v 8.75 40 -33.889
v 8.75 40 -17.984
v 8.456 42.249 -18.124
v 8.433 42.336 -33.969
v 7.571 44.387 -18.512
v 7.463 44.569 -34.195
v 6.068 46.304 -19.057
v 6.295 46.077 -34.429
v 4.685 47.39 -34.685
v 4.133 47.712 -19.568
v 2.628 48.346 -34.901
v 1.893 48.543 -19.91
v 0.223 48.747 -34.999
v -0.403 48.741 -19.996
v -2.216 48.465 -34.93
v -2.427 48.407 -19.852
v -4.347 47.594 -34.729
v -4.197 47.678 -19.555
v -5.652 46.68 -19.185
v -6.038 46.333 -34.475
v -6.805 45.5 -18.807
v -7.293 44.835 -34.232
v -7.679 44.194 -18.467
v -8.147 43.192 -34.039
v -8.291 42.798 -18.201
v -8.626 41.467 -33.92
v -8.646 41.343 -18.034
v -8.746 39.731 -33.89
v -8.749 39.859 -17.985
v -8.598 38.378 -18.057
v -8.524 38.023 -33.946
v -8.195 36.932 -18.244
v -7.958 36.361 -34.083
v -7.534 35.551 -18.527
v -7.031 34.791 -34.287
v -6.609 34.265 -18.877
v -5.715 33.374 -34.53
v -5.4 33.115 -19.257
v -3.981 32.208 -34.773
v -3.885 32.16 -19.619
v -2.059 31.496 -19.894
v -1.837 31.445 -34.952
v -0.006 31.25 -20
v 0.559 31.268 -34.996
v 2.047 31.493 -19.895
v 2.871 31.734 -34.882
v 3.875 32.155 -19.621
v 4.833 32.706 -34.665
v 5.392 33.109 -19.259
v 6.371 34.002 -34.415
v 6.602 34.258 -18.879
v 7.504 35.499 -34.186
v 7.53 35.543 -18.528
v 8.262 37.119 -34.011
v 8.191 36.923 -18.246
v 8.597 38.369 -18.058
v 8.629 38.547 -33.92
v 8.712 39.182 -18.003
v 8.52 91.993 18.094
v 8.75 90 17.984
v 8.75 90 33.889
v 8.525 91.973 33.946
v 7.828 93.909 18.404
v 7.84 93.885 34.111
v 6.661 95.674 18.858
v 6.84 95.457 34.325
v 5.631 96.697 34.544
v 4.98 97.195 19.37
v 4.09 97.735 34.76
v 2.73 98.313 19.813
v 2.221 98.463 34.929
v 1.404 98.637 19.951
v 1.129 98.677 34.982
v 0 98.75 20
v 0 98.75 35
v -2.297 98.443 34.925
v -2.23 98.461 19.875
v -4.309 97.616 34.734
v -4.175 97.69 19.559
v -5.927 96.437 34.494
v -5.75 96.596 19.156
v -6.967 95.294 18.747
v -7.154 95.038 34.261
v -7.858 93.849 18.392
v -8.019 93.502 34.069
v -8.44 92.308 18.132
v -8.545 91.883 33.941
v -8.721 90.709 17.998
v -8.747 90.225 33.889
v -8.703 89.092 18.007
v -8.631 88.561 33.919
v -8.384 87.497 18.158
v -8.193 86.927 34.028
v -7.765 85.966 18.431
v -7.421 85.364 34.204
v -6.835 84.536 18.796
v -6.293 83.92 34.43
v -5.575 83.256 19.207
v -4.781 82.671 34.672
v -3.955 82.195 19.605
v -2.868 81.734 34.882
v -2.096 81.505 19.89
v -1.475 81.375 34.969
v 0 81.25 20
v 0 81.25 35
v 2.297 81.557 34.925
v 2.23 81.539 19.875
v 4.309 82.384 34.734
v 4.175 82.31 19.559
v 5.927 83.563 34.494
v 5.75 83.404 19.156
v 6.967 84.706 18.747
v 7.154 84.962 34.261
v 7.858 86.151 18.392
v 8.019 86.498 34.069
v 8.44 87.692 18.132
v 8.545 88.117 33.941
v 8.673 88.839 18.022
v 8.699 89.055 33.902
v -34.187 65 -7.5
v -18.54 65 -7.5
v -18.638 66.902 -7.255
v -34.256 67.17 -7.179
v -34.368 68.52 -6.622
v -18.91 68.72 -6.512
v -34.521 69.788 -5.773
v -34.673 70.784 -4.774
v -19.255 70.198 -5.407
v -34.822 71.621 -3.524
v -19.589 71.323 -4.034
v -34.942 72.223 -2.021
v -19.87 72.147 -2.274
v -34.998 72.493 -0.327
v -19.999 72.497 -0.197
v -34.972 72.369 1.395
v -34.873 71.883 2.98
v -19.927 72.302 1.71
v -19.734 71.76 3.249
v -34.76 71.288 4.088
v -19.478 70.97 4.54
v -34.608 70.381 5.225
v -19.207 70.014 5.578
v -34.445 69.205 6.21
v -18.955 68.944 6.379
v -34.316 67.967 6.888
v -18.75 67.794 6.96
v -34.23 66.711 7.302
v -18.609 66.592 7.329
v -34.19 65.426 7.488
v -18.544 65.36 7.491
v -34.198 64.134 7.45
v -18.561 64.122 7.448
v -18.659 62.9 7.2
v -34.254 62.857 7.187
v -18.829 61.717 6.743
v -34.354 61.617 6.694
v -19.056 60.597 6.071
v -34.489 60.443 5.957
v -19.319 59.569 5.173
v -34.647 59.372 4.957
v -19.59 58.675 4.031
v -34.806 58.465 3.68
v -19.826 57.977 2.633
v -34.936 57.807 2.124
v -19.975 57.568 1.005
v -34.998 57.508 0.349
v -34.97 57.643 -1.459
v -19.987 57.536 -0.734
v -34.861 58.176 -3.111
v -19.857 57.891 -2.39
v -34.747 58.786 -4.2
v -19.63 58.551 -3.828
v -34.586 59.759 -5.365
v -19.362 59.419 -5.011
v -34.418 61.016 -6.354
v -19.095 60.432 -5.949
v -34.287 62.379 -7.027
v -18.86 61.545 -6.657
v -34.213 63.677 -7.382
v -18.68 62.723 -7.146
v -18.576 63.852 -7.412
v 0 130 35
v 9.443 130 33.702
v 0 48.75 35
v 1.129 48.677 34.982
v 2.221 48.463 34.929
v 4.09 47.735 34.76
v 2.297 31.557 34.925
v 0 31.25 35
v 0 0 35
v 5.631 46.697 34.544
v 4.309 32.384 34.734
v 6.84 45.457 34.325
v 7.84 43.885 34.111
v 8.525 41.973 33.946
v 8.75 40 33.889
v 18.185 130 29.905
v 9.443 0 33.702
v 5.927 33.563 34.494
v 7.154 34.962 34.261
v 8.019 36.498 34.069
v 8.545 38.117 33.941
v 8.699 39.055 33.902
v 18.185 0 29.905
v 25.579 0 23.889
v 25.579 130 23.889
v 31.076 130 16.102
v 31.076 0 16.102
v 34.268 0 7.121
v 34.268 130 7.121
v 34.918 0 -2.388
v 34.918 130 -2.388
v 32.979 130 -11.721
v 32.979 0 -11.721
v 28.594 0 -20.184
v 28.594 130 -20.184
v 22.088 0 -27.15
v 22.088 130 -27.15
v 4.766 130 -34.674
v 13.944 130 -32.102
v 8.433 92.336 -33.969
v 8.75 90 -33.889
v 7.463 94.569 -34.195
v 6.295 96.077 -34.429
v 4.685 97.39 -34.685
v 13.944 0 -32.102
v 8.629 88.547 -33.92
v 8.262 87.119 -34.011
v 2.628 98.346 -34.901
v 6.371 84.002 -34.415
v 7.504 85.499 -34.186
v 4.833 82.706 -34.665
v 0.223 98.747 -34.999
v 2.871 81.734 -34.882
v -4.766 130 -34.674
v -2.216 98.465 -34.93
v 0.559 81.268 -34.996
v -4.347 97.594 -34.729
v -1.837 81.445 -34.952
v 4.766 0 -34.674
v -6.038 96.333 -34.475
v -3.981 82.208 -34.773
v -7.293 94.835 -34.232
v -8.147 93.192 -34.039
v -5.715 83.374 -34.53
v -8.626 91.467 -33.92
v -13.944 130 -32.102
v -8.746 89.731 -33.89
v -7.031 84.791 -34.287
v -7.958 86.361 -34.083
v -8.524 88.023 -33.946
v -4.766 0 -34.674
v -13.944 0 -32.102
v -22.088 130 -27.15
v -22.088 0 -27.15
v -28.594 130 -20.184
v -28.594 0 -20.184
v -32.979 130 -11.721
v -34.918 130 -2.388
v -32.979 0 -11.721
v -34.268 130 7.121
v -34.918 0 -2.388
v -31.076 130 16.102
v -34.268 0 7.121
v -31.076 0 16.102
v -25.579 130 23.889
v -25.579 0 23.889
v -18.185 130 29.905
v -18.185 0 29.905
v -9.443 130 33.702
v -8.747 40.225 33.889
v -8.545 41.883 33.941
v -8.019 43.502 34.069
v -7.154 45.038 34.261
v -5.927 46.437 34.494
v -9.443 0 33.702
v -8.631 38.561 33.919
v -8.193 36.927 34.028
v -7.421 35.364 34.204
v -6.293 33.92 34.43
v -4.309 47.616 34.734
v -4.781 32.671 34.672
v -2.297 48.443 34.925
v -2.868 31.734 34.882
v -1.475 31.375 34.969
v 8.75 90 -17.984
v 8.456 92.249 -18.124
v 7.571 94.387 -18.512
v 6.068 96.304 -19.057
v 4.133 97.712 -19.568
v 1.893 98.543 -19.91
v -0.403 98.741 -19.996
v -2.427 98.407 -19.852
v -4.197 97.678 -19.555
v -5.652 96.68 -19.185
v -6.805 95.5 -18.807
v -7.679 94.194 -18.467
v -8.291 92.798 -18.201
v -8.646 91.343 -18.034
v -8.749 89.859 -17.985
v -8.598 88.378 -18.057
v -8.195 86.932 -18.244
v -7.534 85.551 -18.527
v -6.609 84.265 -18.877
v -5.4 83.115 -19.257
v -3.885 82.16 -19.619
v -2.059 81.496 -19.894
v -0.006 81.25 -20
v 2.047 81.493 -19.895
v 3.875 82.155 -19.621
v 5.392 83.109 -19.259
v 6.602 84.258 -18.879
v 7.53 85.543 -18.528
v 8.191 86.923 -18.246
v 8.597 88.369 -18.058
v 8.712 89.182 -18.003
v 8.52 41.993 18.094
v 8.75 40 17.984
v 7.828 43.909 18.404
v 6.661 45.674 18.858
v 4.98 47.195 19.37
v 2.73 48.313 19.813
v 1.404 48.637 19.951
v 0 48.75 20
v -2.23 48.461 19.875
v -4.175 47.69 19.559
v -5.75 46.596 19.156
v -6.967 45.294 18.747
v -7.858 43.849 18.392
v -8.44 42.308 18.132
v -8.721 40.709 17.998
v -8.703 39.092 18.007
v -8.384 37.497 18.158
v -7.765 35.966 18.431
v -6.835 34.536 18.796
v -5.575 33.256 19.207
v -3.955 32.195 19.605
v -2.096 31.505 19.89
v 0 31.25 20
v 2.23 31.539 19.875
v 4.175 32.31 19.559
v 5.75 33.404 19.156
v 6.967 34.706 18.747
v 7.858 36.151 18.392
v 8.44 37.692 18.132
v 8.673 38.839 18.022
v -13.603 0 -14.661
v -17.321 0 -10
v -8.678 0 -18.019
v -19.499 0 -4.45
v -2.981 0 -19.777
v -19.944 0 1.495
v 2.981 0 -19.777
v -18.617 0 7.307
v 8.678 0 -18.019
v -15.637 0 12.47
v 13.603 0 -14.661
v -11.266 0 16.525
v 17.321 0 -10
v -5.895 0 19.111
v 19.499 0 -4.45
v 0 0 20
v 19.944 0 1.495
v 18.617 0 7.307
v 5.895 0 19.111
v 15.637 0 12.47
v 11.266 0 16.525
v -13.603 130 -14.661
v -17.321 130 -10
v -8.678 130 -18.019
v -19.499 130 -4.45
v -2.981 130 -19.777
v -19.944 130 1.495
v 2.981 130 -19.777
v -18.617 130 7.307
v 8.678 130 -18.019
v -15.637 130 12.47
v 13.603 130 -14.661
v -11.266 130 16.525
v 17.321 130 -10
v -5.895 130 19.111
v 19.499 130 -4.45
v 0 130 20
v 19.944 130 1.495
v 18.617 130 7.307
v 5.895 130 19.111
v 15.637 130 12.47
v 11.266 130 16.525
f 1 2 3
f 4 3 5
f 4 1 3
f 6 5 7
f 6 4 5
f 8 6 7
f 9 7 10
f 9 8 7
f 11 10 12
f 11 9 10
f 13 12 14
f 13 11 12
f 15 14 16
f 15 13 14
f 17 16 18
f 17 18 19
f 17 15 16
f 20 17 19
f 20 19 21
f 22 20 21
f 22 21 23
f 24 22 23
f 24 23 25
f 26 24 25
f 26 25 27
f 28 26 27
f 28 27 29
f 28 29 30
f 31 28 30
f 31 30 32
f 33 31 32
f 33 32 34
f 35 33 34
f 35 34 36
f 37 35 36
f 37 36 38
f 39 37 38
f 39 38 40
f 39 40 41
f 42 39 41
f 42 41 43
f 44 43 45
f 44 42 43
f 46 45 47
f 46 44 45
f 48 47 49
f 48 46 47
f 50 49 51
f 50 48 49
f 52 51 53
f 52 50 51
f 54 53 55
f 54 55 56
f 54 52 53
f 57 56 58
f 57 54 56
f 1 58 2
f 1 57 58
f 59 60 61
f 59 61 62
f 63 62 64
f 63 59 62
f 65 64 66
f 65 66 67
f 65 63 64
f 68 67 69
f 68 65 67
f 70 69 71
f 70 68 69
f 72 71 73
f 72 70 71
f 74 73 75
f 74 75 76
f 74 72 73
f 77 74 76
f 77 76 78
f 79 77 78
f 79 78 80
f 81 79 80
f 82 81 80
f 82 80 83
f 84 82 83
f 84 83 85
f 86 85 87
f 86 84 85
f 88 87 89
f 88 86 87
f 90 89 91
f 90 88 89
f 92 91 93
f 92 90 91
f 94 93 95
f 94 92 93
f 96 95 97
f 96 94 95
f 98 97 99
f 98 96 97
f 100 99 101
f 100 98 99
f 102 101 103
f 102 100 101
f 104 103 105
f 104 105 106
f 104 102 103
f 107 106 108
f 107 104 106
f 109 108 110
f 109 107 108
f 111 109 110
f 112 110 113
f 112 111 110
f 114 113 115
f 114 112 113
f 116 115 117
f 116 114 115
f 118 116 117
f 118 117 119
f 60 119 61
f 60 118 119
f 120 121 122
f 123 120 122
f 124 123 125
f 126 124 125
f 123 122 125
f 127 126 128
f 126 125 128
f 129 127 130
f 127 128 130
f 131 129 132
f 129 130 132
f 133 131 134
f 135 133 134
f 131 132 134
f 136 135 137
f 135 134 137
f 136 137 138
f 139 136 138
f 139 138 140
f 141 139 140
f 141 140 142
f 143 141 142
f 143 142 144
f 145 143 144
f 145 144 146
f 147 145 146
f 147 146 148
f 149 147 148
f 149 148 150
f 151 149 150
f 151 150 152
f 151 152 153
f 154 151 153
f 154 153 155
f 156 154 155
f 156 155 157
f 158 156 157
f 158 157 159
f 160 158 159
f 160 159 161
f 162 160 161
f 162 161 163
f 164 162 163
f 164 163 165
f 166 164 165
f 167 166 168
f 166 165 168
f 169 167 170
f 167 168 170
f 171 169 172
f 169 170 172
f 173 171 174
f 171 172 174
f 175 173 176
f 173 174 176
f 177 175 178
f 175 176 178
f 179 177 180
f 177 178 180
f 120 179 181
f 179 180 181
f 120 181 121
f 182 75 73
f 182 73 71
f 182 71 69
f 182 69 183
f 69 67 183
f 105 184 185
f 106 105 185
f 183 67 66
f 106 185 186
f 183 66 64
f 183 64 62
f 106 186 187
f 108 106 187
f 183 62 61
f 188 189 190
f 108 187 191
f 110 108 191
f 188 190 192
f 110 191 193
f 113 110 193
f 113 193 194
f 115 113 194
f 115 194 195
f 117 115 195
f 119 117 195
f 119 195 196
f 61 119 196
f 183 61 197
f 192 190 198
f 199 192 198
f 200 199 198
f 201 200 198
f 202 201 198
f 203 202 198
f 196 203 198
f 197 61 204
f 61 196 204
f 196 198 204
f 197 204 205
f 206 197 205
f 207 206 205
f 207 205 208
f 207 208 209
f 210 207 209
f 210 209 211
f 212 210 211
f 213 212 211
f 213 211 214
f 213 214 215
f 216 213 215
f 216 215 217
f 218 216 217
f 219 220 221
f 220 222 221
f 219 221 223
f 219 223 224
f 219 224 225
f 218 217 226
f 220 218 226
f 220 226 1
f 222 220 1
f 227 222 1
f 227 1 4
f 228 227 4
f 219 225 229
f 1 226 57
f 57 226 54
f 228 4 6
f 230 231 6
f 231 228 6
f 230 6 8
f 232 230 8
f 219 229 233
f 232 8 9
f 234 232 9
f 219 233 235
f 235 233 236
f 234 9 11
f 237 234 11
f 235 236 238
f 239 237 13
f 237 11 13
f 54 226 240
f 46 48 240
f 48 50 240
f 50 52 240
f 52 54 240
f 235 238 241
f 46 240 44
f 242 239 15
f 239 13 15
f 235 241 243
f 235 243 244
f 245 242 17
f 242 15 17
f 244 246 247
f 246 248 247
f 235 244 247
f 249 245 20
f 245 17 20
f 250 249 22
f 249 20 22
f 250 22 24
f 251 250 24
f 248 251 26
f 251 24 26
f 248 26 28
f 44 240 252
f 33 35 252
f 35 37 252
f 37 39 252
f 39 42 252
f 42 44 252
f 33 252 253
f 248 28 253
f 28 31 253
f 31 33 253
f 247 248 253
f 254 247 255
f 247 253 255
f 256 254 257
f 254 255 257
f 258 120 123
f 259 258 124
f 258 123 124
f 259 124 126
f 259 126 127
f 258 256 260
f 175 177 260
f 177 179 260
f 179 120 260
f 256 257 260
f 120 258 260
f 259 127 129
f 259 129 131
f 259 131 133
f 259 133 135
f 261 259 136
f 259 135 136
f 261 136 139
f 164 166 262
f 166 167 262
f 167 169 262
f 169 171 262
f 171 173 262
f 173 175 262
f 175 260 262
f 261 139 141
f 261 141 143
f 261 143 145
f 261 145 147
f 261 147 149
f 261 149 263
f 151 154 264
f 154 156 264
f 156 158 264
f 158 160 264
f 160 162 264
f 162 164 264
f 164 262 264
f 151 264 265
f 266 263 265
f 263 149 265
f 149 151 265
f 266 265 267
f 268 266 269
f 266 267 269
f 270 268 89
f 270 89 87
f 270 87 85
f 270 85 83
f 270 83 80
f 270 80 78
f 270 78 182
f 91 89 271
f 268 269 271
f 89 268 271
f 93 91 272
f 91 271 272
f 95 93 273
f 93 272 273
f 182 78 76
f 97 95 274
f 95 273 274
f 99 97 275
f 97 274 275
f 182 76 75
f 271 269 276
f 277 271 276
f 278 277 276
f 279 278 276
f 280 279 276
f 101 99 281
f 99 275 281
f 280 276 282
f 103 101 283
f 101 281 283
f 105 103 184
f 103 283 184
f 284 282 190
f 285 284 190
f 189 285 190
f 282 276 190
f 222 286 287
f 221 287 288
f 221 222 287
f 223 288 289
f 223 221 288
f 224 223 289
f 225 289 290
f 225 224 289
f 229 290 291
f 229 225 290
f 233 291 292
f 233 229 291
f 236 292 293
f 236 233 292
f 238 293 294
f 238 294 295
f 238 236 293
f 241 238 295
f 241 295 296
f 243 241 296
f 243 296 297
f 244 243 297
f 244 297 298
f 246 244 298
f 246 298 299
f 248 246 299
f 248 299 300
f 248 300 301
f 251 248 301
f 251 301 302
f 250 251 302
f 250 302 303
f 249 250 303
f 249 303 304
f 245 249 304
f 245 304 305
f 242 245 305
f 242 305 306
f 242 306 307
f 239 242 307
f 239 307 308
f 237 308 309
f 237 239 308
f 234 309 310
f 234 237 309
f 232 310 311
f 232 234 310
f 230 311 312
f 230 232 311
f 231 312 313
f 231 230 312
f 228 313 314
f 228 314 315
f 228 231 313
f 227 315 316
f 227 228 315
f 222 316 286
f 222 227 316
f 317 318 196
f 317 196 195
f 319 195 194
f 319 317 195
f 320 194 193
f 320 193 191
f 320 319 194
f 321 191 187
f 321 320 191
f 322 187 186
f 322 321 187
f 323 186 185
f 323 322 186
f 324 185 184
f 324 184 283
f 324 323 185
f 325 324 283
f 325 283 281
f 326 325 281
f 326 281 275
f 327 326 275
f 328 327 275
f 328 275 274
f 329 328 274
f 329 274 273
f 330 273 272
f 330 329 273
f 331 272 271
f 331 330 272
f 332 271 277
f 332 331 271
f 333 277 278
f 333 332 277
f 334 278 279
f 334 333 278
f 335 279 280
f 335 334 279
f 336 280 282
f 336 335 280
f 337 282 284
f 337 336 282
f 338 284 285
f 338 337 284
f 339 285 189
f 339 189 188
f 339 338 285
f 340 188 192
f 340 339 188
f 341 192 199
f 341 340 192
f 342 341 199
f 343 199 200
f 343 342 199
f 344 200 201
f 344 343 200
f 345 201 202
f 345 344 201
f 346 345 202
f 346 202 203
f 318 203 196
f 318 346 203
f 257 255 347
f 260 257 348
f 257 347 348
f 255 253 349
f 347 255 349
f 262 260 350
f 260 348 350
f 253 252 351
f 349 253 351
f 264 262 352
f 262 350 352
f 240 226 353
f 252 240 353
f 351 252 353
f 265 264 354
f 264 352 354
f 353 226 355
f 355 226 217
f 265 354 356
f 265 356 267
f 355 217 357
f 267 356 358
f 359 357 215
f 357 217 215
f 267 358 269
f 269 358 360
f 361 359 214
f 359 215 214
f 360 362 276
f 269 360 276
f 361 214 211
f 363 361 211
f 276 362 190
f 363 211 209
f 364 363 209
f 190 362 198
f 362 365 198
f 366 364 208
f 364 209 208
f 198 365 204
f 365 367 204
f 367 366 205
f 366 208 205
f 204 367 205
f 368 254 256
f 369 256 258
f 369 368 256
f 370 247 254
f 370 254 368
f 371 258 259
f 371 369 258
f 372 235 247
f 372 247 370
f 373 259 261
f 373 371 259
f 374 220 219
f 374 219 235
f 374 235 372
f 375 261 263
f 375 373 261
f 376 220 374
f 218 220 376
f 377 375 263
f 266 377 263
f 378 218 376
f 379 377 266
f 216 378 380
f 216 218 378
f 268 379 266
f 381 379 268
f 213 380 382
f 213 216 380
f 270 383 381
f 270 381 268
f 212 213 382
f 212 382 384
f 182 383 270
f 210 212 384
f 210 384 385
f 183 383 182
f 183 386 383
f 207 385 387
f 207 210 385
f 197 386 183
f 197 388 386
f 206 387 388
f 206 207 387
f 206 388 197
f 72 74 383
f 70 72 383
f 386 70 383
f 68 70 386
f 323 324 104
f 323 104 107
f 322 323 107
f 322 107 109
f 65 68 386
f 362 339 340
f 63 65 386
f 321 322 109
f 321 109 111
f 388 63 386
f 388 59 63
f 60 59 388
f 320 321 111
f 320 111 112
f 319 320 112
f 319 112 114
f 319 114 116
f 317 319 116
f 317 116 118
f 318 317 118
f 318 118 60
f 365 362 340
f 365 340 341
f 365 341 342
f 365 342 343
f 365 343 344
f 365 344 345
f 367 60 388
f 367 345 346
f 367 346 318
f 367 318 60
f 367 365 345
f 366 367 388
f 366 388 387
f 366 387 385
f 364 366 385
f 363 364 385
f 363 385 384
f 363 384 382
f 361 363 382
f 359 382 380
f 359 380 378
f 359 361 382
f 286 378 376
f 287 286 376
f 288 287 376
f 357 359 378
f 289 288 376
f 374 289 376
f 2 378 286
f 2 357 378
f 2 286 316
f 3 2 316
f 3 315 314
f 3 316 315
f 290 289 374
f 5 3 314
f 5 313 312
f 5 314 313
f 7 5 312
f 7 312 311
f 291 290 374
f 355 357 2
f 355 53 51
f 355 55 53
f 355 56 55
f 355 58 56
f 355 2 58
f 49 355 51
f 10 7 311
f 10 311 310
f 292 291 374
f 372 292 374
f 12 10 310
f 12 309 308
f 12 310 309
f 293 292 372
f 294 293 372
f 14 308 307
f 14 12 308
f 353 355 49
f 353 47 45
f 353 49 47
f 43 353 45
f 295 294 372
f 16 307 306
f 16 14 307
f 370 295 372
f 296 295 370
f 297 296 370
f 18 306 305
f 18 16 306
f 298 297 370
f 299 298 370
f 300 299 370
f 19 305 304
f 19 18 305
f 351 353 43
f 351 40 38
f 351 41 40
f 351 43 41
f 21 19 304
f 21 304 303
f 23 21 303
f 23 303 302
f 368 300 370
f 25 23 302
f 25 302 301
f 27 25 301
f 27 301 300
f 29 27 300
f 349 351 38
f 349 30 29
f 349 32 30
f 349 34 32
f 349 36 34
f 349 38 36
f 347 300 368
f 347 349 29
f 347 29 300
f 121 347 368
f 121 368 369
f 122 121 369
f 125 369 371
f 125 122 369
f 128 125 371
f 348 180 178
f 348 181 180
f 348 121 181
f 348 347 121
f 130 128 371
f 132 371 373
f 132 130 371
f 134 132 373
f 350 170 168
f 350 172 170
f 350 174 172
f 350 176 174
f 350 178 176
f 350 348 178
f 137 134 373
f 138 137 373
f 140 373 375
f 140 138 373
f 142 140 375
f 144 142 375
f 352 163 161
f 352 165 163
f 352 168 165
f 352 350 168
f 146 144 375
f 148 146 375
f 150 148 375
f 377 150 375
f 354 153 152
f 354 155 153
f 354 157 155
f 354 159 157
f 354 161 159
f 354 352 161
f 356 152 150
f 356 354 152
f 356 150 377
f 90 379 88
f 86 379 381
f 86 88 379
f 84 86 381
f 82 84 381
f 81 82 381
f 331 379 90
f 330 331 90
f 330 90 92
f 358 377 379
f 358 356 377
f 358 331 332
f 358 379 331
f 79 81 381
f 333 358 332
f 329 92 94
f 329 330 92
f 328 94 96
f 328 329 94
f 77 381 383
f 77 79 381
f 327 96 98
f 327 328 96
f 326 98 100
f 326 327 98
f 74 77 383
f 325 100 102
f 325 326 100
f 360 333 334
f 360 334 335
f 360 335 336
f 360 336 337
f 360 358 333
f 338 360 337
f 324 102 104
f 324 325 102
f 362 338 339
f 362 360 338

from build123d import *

# Parameters (mm, degrees)
ESQUISSE1_R                  = 35
ESQUISSE1_R_2                = 20
BOSS_EXTRU_1_DEPTH           = 130
ENL_V_MAT_EXTRU_1_DEPTH      = 140.104277432
ENL_V_MAT_EXTRU_1_DEPTH_BACK = 140.104277432
ESQUISSE2_R                  = 8.75
ESQUISSE4_R                  = 7.5
ENL_V_MAT_EXTRU_2_DEPTH      = 140.104277576


with BuildPart() as part:
    # Esquisse1 → Boss.-Extru.1 (new body)
    with BuildSketch(Plane(origin=(0, 0, 0), x_dir=(1, 0, 0), z_dir=(0, 1, 0))):
        with Locations(Location((0, 0, 0), (0, 0, 270))):
            Circle(ESQUISSE1_R)
        with Locations(Location((0, 0, 0), (0, 0, 270))):
            Circle(ESQUISSE1_R_2, mode=Mode.SUBTRACT)
    extrude(amount=BOSS_EXTRU_1_DEPTH)

    # Esquisse2 → Enlèv. mat.-Extru.1 (cut, two sides: drawn at the far end of the back side and taken through both)
    with BuildSketch(Plane.XY.offset(-ENL_V_MAT_EXTRU_1_DEPTH_BACK)):
        with Locations((0, 90)):
            Circle(ESQUISSE2_R)
        with Locations((0, 40)):
            Circle(ESQUISSE2_R)
    extrude(amount=ENL_V_MAT_EXTRU_1_DEPTH + ENL_V_MAT_EXTRU_1_DEPTH_BACK, mode=Mode.SUBTRACT)

    # Esquisse4 → Enlèv. mat.-Extru.2 (cut, through all)
    with BuildSketch(Plane(origin=(0, 0, 0), x_dir=(0, 0, -1), z_dir=(1, 0, 0))):
        with Locations((0, 65)):
            Circle(ESQUISSE4_R)
    extrude(amount=-ENL_V_MAT_EXTRU_2_DEPTH, mode=Mode.SUBTRACT)


solid = part.part
